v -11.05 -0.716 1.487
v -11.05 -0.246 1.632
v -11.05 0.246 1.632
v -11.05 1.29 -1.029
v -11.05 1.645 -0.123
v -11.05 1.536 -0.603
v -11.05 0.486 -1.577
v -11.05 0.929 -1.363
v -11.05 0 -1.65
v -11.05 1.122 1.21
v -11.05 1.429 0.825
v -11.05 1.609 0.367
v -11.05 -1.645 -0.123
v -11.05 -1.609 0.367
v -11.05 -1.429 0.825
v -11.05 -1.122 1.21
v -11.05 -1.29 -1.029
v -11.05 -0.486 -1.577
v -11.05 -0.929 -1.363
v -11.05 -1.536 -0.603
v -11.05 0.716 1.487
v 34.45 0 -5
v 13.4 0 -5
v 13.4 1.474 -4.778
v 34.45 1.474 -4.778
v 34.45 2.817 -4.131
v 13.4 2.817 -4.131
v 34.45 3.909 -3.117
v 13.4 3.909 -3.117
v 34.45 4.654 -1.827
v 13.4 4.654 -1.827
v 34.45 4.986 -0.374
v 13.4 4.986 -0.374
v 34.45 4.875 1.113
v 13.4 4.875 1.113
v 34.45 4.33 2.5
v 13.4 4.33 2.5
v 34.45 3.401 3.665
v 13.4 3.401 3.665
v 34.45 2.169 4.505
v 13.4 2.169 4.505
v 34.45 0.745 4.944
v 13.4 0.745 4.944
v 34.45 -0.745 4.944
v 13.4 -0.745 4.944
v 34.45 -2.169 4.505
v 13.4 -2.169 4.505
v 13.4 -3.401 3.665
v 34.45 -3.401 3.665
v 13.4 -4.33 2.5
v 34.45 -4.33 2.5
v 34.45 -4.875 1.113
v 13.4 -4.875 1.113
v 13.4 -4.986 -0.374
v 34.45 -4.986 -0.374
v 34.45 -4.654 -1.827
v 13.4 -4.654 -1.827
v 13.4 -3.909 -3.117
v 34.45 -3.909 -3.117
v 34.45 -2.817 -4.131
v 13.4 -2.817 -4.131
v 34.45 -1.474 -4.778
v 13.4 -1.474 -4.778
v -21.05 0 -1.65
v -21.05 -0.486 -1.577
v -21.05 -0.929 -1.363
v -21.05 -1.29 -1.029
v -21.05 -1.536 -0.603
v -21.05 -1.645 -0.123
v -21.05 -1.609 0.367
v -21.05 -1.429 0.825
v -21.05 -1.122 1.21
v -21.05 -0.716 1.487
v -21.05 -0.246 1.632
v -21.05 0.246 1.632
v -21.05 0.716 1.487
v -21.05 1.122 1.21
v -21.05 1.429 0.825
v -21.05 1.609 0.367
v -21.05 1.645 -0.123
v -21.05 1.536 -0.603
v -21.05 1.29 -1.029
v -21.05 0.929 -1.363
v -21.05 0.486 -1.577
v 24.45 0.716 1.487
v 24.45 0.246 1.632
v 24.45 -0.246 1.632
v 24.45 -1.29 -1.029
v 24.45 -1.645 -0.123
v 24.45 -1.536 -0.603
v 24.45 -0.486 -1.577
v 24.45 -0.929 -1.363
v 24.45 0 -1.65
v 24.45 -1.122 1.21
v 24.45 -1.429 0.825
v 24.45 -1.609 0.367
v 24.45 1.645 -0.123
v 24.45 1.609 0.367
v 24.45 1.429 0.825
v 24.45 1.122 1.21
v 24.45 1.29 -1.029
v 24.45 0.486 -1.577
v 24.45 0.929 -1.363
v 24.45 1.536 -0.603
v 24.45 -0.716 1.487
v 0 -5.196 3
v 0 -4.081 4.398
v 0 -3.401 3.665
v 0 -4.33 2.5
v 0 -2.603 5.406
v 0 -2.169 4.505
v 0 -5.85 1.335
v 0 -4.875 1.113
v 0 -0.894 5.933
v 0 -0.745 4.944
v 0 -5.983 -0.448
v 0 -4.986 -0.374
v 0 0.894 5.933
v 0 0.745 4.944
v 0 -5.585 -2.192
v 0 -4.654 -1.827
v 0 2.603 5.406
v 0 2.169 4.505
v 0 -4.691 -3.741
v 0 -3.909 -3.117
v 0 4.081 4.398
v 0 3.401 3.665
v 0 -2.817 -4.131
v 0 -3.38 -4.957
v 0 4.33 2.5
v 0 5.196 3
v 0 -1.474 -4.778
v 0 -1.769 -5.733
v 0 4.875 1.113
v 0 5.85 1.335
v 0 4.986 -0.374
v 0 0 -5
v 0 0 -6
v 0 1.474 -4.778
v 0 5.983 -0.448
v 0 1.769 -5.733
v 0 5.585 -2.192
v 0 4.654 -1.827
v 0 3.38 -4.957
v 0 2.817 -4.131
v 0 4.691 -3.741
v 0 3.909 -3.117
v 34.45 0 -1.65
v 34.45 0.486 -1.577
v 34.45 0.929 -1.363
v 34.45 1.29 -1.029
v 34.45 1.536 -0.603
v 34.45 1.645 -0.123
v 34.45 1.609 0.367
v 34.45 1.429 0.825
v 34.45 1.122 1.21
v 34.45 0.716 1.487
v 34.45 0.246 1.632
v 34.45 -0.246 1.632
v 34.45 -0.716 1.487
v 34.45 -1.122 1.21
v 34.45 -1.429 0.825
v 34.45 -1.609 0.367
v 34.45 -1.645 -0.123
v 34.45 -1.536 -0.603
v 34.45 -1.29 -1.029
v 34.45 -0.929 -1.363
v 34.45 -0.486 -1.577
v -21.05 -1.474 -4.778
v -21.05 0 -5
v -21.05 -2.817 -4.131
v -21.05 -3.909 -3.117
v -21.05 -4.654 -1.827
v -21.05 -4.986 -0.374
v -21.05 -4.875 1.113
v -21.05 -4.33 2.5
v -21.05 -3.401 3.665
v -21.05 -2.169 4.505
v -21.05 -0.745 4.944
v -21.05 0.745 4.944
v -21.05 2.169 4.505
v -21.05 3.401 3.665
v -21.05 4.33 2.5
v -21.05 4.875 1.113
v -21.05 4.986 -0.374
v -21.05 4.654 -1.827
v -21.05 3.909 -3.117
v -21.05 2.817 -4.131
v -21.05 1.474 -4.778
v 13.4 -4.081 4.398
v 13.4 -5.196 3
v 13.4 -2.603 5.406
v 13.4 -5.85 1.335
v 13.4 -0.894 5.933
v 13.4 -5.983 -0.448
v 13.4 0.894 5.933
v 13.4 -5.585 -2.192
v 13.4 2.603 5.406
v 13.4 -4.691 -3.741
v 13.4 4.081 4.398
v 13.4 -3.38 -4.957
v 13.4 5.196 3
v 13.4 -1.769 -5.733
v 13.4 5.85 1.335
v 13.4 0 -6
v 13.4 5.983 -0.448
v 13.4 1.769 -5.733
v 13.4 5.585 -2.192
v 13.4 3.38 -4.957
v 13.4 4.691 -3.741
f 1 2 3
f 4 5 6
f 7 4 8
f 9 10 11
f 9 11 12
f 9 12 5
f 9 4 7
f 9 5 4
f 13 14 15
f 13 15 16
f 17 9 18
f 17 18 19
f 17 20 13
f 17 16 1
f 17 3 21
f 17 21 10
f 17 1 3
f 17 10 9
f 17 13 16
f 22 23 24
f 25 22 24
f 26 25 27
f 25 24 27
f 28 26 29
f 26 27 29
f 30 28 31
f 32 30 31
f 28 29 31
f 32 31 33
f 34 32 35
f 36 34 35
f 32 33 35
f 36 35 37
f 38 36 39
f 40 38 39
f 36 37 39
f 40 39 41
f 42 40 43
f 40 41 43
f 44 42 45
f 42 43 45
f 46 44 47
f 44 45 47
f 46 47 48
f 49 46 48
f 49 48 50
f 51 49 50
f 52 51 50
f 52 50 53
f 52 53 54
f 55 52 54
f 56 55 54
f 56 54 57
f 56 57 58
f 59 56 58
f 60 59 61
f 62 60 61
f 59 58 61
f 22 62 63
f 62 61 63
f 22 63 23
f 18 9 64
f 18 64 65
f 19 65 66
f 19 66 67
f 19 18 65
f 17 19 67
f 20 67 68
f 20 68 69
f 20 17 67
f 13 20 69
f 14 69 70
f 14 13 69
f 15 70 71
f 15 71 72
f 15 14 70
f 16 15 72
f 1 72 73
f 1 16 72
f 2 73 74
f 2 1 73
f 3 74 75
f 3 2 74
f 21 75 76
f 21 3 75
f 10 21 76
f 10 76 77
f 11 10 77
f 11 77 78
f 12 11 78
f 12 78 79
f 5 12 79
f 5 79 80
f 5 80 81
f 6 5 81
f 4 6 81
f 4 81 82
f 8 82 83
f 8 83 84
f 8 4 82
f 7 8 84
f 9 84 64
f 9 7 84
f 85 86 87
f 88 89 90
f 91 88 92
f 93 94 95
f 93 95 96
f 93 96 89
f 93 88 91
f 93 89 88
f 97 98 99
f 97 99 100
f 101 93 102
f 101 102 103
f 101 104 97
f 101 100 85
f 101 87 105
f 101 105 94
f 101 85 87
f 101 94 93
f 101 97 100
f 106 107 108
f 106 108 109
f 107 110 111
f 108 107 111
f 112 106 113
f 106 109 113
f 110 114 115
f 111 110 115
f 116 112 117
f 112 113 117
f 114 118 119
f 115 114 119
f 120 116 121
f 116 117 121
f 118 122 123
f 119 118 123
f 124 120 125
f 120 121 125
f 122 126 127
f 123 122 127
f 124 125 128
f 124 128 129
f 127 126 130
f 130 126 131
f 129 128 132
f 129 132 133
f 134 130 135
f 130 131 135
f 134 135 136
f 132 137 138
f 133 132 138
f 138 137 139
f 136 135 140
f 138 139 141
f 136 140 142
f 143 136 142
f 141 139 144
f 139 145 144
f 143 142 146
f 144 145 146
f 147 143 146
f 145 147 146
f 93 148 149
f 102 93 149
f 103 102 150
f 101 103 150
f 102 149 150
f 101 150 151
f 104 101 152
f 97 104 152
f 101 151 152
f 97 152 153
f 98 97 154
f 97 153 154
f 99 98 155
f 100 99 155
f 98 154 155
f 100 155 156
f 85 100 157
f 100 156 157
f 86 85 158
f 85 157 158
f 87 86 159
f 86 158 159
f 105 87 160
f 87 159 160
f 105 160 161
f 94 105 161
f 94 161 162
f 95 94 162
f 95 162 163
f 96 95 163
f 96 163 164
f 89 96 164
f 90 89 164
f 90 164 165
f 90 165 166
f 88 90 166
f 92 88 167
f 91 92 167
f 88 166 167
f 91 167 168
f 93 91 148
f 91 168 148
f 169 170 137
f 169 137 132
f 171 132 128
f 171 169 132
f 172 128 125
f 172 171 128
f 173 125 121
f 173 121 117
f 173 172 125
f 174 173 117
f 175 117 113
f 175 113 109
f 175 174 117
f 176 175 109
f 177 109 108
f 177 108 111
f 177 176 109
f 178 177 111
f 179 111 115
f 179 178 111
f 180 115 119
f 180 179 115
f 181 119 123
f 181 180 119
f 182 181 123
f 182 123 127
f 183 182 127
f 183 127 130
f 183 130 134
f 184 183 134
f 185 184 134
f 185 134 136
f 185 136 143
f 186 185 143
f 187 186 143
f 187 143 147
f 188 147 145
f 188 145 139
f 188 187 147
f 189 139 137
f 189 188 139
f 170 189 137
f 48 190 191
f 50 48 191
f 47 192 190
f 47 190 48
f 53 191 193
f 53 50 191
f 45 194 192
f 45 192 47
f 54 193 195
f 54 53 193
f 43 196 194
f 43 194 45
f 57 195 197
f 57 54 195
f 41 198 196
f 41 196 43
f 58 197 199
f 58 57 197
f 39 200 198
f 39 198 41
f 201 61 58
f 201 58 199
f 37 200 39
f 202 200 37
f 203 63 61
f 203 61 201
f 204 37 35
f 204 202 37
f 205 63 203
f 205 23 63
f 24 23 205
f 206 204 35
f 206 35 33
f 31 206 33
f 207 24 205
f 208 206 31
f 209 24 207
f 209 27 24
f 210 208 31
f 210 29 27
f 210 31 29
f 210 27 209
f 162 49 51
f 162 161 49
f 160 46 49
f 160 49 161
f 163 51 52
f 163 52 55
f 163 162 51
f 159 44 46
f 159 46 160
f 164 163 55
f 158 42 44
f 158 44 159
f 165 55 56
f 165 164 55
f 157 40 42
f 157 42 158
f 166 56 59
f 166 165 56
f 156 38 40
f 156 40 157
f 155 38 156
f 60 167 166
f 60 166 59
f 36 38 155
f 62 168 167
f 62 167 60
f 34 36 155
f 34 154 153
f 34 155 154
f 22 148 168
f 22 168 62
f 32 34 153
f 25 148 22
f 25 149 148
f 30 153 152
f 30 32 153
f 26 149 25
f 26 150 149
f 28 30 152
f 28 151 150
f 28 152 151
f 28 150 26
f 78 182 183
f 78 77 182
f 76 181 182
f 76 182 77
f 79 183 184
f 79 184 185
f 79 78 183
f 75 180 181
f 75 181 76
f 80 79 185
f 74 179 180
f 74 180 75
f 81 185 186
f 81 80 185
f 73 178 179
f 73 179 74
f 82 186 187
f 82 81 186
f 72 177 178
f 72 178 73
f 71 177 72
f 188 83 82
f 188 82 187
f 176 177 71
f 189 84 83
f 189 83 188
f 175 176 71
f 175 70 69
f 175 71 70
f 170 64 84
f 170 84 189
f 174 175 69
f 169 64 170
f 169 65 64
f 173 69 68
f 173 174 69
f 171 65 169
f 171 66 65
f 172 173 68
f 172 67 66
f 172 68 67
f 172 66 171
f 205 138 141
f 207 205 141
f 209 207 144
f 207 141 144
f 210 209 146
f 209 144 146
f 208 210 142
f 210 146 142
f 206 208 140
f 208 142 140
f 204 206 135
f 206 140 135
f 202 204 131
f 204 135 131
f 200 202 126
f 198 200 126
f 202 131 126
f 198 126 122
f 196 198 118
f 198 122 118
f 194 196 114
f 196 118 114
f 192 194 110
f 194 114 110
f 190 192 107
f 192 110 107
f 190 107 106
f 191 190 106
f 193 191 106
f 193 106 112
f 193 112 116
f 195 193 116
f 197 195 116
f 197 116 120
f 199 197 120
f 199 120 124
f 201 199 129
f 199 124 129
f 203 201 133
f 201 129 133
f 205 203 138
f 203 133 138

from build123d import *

# Parameters (mm, degrees)
SKETCH_1_R          = 6
EXTRUDE_1_DEPTH     = 13.4
SKETCH_2_R          = 5
EXTRUDE_2_DEPTH     = 21.05
EXTRUDE_START       = 21.05
SKETCH_3_R          = 5
EXTRUDE_3_DEPTH     = 21.05
SKETCH_4_R          = 1.65
CUT_EXTRUDE_1_DEPTH = 10
CUT_EXTRUDE_START   = -10
SKETCH_5_R          = 1.65
CUT_EXTRUDE_2_DEPTH = 10


with BuildPart() as part:
    # ｽｹｯﾁ1 → ﾎﾞｽ - 押し出し1 (new body)
    with BuildSketch(Plane(origin=(0, 0, 0), x_dir=(0, 0, -1), z_dir=(1, 0, 0))):
        Circle(SKETCH_1_R)
    extrude(amount=EXTRUDE_1_DEPTH)

    # ｽｹｯﾁ2 → ﾎﾞｽ - 押し出し2 (add)
    with BuildSketch(Plane(origin=(13.4, 0, 0), x_dir=(0, 0, -1), z_dir=(1, 0, 0))):
        Circle(SKETCH_2_R)
    extrude(amount=EXTRUDE_2_DEPTH)

    # ｽｹｯﾁ3 → ﾎﾞｽ - 押し出し3 (add)
    with BuildSketch(Plane.ZY.offset(EXTRUDE_START)):
        with Locations(Location((0, 0, 0), (0, 0, 180))):
            Circle(SKETCH_3_R)
    extrude(amount=-EXTRUDE_3_DEPTH)

    # ｽｹｯﾁ4 → ｶｯﾄ - 押し出し1 (cut)
    with BuildSketch(Plane(origin=(34.45, 0, 0), x_dir=(0, 0, -1), z_dir=(1, 0, 0))):
        Circle(SKETCH_4_R)
    extrude(amount=-CUT_EXTRUDE_1_DEPTH, mode=Mode.SUBTRACT)

    # ｽｹｯﾁ5 → ｶｯﾄ - 押し出し2 (cut)
    with BuildSketch(Plane.ZY.offset(21.05).offset(CUT_EXTRUDE_START)):
        with Locations(Location((0, 0, 0), (0, 0, 180))):
            Circle(SKETCH_5_R)
    extrude(amount=CUT_EXTRUDE_2_DEPTH, mode=Mode.SUBTRACT)


solid = part.part
